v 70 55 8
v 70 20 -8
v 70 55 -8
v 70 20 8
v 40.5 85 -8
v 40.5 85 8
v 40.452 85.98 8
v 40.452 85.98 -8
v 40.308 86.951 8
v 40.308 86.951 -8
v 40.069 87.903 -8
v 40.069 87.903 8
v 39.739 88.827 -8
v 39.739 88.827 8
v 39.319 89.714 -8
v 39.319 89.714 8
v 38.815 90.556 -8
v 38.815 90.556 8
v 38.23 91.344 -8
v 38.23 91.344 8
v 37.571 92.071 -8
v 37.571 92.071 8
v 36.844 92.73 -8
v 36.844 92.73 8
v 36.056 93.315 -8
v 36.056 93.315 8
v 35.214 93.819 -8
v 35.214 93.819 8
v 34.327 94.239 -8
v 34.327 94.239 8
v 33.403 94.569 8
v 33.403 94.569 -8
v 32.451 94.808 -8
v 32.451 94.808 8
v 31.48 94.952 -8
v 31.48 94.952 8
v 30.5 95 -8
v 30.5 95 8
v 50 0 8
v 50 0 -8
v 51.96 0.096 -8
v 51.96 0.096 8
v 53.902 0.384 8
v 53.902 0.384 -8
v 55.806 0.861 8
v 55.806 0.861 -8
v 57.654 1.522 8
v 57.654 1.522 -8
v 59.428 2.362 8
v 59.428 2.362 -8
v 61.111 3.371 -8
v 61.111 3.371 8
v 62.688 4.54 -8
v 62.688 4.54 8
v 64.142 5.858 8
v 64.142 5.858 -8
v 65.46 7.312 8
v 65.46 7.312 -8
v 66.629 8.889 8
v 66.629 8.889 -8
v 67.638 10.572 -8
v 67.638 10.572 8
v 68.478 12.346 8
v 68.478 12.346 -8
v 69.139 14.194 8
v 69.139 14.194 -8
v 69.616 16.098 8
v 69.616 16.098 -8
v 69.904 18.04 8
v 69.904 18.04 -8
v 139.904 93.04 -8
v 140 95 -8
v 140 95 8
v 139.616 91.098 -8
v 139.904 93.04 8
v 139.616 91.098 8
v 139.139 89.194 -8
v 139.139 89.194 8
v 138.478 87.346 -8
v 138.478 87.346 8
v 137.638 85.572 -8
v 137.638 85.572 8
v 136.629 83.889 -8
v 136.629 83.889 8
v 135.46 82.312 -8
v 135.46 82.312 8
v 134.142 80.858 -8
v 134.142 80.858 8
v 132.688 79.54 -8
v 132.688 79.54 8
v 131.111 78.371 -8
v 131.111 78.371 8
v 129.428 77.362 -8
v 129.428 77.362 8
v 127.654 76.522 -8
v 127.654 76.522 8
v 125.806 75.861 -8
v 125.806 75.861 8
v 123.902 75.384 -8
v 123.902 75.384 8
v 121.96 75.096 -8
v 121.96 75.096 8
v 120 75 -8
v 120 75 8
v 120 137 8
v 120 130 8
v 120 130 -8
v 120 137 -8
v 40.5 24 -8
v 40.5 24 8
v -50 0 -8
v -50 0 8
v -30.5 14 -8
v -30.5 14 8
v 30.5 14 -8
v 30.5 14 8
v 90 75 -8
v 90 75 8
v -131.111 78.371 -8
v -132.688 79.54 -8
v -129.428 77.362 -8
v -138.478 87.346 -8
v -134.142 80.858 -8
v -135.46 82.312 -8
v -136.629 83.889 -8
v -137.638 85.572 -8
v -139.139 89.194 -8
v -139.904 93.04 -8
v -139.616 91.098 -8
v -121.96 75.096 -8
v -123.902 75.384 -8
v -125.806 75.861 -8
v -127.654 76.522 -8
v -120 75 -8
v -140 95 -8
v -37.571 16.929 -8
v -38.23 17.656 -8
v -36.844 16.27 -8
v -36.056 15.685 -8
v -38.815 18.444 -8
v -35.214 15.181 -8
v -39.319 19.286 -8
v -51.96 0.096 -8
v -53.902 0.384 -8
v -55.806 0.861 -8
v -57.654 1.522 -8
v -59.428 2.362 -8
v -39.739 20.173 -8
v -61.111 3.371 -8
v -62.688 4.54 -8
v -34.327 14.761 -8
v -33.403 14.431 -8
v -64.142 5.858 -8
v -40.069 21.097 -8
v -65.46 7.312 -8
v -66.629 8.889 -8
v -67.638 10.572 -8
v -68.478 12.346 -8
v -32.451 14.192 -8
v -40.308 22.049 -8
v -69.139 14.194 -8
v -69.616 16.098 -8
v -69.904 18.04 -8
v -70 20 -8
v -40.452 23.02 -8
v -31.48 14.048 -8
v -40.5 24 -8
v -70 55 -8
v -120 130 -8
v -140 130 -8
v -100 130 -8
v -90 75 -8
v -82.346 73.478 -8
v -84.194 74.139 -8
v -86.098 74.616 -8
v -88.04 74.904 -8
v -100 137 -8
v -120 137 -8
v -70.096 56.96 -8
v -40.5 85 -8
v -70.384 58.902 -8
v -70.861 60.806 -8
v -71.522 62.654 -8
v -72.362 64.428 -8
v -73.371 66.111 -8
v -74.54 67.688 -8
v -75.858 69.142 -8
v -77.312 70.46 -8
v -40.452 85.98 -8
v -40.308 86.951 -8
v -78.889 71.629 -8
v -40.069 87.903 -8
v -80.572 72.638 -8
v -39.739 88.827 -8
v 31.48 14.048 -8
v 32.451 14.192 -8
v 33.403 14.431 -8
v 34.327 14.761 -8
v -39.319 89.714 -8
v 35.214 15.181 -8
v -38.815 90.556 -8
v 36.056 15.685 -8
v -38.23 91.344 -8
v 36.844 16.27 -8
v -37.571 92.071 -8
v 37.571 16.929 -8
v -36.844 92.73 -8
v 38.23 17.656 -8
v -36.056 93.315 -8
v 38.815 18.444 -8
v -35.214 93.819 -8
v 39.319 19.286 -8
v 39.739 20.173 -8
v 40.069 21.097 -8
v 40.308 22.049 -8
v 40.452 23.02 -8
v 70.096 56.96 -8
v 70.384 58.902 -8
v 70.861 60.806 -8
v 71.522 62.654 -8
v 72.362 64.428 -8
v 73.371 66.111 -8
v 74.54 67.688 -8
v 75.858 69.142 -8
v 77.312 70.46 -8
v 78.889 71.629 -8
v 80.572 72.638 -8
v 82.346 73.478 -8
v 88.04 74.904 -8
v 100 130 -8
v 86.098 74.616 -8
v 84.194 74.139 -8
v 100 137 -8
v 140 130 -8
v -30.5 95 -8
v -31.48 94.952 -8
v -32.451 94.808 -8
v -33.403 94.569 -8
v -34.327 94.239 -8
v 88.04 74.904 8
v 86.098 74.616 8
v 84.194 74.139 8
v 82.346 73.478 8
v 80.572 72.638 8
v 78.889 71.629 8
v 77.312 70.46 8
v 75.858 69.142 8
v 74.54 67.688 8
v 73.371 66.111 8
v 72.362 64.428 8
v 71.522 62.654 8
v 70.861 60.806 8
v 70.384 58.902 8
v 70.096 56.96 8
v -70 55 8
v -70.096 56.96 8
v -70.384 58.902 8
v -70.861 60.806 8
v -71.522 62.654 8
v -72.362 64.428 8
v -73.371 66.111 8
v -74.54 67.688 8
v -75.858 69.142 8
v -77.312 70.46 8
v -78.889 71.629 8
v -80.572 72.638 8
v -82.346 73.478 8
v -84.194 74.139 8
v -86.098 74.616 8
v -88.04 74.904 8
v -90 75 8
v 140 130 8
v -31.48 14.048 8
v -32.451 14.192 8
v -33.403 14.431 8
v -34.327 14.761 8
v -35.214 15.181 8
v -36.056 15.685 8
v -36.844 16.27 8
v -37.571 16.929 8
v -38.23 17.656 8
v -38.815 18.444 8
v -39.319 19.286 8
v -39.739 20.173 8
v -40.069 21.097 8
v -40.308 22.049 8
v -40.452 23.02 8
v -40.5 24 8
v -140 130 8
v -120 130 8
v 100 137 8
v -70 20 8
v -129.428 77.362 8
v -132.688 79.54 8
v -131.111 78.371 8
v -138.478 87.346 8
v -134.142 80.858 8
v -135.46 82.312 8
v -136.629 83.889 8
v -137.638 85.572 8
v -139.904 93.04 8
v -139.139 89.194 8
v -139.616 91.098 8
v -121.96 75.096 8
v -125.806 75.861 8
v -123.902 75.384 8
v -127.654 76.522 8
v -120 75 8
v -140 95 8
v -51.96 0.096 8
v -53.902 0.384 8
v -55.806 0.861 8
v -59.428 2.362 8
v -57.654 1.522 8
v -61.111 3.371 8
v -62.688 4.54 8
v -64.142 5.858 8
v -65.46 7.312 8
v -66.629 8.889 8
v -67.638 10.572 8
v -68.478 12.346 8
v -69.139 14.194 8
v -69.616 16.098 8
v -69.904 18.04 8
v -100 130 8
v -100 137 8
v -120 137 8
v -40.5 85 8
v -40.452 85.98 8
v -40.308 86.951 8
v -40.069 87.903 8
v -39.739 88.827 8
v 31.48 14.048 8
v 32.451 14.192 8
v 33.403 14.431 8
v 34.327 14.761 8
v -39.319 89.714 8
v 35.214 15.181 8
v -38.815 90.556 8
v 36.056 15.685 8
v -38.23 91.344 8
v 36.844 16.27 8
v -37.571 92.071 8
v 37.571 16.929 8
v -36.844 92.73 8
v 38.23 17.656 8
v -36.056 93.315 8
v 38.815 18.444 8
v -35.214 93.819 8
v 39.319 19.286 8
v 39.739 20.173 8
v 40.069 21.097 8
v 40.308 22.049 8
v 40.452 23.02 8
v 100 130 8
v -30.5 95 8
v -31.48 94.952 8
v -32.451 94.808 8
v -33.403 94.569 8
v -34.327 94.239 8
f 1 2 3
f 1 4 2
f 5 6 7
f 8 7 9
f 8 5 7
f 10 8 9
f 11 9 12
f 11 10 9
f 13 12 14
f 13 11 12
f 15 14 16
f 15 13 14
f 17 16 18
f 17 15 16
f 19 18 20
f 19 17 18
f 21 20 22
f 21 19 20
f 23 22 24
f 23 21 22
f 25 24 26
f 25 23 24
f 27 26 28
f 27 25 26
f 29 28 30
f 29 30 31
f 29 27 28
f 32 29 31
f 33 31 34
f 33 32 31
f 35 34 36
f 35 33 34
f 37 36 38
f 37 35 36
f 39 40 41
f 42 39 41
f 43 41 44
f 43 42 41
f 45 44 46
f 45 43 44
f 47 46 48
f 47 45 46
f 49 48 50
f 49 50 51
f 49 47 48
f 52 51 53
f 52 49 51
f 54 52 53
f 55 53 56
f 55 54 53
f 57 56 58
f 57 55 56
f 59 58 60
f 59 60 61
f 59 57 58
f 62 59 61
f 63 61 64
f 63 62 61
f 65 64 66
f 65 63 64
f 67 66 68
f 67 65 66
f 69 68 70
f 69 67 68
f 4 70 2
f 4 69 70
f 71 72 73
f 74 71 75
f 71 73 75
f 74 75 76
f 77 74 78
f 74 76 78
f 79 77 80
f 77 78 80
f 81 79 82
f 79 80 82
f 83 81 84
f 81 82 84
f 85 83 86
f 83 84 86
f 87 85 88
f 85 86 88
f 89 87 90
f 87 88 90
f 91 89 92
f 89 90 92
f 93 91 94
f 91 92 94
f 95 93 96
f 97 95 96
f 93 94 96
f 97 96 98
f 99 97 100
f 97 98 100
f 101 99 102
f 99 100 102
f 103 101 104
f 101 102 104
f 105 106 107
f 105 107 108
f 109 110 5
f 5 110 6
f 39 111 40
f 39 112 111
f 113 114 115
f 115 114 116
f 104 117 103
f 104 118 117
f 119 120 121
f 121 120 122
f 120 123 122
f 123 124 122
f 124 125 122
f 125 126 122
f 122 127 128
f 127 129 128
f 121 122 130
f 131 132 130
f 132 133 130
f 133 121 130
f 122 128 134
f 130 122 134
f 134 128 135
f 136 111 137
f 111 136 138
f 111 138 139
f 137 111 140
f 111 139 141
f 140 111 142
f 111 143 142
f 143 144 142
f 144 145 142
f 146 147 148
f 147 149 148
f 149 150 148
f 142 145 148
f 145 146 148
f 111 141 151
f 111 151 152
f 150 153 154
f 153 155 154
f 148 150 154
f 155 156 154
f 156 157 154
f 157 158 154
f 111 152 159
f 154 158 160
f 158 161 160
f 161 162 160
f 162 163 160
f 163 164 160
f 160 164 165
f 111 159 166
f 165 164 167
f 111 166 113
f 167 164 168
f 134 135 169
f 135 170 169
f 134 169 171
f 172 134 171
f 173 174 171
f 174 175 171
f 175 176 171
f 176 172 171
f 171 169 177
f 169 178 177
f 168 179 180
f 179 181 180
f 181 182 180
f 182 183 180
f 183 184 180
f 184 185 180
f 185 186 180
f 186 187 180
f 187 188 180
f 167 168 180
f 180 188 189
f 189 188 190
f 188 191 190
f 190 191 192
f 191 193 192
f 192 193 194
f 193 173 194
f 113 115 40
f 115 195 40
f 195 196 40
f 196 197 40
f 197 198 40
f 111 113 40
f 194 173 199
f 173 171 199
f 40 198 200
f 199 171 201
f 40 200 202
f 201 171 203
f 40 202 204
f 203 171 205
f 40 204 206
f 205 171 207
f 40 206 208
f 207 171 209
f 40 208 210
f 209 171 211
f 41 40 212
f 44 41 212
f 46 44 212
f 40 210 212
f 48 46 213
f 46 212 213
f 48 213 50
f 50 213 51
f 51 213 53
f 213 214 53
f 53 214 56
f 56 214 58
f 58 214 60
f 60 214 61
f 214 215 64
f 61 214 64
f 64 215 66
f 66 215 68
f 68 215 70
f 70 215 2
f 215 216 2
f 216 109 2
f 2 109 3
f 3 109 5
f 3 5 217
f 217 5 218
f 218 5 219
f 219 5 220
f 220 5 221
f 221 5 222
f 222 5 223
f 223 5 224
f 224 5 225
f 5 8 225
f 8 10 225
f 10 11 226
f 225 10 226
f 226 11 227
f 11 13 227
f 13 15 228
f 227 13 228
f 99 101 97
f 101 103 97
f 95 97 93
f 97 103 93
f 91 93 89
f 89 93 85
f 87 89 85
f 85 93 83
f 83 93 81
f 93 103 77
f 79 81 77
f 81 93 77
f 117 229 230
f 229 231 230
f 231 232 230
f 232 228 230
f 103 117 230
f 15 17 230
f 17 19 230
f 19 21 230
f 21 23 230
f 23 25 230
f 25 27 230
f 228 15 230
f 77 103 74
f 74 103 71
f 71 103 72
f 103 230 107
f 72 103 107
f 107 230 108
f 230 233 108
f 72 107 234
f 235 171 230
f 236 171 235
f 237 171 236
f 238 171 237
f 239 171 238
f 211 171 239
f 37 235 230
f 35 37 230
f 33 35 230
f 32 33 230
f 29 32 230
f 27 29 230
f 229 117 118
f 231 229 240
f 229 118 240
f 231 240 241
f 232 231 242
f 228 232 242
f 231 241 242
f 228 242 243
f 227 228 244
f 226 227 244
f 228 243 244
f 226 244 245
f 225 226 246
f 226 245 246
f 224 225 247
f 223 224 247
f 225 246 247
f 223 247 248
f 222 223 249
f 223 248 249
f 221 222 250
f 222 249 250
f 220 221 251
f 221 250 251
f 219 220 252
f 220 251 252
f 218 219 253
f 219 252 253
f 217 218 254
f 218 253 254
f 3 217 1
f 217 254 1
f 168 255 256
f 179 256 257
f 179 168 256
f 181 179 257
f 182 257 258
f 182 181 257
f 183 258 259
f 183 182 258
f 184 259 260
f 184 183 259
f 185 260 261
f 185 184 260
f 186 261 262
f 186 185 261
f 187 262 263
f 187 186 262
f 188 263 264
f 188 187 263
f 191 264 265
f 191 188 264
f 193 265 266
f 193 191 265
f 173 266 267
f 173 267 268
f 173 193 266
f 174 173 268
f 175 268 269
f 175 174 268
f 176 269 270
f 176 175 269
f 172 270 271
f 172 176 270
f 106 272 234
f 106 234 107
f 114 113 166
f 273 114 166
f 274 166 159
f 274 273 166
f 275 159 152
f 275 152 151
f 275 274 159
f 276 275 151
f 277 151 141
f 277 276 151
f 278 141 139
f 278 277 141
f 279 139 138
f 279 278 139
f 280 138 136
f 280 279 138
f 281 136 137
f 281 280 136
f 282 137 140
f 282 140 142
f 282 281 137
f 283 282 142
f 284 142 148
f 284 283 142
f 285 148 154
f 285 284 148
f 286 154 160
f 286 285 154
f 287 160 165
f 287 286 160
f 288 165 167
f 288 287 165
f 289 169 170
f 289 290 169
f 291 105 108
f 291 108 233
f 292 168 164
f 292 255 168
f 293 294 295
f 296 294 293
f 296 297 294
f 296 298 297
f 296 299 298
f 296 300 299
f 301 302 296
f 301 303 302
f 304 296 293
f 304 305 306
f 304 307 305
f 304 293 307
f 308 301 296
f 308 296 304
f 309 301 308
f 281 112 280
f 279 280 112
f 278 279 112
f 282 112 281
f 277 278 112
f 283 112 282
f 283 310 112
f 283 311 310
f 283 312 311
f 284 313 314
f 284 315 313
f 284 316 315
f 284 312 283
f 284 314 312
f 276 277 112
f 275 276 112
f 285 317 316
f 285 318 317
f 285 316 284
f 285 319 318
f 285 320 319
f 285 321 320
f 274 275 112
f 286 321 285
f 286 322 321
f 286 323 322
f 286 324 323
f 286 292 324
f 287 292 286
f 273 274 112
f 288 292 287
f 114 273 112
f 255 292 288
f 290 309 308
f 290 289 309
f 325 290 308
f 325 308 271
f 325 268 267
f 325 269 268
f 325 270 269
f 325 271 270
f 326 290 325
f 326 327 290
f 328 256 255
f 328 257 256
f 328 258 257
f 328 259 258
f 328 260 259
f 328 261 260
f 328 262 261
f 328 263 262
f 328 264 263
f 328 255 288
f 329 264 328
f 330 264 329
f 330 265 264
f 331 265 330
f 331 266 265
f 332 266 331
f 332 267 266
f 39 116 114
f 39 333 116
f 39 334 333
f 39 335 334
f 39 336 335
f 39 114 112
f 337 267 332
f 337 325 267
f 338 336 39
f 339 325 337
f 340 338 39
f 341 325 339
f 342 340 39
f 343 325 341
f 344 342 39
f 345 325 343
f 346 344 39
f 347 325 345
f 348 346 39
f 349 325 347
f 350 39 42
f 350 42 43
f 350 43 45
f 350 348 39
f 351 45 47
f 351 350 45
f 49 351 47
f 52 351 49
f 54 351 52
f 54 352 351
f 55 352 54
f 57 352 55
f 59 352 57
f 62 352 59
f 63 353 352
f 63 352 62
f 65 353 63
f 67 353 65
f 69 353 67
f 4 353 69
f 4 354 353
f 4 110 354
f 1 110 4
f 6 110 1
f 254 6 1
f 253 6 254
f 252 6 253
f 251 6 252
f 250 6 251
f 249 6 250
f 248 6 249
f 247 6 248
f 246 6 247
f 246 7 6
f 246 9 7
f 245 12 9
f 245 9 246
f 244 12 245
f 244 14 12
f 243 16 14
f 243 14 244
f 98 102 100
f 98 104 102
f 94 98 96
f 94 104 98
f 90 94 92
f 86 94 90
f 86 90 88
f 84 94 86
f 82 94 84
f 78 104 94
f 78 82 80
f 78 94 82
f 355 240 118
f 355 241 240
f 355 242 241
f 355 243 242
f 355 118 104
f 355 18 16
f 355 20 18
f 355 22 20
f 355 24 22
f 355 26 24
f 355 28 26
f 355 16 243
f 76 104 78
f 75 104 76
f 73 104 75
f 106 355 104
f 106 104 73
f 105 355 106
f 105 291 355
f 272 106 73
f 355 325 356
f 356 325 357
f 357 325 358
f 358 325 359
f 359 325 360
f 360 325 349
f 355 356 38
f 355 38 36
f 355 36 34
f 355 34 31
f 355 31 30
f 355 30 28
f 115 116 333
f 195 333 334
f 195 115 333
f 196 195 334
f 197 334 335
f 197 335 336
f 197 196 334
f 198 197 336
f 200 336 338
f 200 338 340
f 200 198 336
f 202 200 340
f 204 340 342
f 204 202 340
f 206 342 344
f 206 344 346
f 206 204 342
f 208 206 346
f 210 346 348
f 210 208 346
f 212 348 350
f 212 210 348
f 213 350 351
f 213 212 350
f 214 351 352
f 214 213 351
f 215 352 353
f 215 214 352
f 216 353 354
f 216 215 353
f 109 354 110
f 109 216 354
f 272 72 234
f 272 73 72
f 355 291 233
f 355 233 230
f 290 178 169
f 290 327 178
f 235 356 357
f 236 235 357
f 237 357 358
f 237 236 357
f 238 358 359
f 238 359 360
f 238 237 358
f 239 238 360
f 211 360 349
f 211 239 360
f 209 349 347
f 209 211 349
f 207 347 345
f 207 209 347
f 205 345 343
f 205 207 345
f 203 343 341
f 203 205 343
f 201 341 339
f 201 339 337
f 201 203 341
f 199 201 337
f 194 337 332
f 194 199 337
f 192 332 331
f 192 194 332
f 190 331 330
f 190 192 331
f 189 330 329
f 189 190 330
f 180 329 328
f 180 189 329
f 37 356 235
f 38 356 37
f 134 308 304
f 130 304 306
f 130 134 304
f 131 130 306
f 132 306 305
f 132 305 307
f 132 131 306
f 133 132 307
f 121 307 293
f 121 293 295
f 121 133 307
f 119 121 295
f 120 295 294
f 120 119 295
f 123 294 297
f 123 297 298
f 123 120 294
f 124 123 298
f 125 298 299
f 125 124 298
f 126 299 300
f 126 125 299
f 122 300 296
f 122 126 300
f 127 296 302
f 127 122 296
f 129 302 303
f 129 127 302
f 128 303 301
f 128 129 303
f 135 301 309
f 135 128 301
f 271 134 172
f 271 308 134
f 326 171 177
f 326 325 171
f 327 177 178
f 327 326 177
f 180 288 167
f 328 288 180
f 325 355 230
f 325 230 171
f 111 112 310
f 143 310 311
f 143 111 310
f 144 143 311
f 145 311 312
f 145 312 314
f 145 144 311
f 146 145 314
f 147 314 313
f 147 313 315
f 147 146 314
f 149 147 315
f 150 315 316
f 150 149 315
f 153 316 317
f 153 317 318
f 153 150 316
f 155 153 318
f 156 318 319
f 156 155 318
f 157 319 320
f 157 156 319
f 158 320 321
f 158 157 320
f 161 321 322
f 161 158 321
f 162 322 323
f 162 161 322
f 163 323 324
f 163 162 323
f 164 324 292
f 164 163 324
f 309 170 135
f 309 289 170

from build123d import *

# Parameters (mm, degrees)
SKETCH_1_W      = 81
SKETCH_1_H      = 81
EXTRUDE_1_DEPTH = 8
FILLET_1_R      = 20
FILLET_2_R      = 10


with BuildPart() as part:
    # 草图1 → 凸台-拉伸1 (new, symmetric)
    with BuildSketch(Plane.XY):
        Polygon((-70, 0), (70, 0), (70, 75), (140, 75), (140, 130), (120, 130), (120, 137), (100, 137), (100, 130), (-100, 130), (-100, 137), (-120, 137), (-120, 130), (-140, 130), (-140, 75), (-70, 75), align=None)
        with Locations((0, 54.5)):
            Rectangle(SKETCH_1_W, SKETCH_1_H, mode=Mode.SUBTRACT)
    extrude(amount=EXTRUDE_1_DEPTH, both=True)

    # 圆角1
    fillet_1_edges = [part.edges().sort_by_distance(p)[0] for p in [
        (70, 0, 0),
        (-70, 0, 0),
        (-70, 75, 0),
        (-140, 75, 0),
        (140, 75, 0),
        (70, 75, 0),
    ]]
    fillet(fillet_1_edges, radius=FILLET_1_R)

    # 圆角2
    fillet_2_edges = [part.edges().sort_by_distance(p)[0] for p in [
        (-40.5, 95, 0),
        (-40.5, 14, 0),
        (40.5, 14, 0),
        (40.5, 95, 0),
    ]]
    fillet(fillet_2_edges, radius=FILLET_2_R)


solid = part.part
